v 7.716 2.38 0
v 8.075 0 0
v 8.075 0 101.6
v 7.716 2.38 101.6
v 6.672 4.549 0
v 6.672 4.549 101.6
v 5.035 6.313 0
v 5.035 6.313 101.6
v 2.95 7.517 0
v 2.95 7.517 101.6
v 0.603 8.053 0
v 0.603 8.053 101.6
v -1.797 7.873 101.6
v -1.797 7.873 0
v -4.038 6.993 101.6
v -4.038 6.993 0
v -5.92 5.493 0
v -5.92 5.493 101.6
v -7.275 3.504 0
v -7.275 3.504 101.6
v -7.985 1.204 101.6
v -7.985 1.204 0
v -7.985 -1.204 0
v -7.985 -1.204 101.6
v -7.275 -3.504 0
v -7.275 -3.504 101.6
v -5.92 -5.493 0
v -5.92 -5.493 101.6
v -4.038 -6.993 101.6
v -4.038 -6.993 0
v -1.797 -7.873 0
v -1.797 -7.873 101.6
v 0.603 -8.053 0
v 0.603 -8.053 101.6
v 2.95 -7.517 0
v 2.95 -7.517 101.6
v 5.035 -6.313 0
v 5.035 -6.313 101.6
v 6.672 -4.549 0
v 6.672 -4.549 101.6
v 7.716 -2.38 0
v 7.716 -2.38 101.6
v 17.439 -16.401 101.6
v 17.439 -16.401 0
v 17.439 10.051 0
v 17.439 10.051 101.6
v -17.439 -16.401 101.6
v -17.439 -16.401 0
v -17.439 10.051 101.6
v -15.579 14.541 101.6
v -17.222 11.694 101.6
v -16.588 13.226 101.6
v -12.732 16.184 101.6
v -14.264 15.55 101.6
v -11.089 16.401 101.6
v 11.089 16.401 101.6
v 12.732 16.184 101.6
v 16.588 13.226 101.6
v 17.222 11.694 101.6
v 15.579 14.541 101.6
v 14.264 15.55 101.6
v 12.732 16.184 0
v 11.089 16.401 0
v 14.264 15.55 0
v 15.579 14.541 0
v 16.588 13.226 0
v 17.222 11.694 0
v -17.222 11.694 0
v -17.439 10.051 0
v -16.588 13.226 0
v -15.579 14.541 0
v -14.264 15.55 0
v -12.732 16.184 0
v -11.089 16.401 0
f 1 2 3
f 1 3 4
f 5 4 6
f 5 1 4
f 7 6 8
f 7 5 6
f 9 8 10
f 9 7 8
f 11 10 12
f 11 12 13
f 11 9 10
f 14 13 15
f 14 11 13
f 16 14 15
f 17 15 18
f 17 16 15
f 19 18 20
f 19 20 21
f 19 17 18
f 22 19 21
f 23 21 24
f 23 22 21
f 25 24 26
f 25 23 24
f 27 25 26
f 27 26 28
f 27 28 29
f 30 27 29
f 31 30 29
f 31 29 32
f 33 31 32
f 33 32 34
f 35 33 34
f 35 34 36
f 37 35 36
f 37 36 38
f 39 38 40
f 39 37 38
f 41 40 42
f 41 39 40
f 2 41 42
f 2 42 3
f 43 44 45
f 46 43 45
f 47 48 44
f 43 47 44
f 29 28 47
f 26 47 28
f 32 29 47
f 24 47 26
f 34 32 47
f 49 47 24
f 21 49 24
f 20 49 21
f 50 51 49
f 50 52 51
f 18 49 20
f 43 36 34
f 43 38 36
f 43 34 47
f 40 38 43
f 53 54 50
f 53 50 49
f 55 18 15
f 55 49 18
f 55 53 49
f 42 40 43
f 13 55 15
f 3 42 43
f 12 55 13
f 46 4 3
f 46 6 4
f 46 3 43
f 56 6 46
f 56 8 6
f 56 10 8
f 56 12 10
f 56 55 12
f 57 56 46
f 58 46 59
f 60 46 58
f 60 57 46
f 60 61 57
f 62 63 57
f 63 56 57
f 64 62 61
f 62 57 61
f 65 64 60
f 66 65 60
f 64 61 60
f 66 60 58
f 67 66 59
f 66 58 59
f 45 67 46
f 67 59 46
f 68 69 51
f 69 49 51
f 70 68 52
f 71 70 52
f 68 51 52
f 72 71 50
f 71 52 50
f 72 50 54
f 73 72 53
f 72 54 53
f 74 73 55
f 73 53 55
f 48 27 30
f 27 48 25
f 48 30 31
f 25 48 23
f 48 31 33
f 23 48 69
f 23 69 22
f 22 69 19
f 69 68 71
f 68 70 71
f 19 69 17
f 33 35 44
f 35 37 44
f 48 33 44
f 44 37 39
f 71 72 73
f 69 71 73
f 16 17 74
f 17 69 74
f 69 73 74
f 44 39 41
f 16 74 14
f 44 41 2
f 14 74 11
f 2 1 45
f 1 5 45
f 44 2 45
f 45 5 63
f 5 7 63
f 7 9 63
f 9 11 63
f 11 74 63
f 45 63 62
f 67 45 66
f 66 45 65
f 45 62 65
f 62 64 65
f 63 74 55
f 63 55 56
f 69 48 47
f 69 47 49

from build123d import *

# Parameters (mm, degrees)
F0_W     = 34.877166
F0_H     = 32.801156
F0_R     = 8.075164
F1_DEPTH = 101.6
F2_R     = 6.35


with BuildPart() as f1:
    # F0 (on Top) → F1 (new body)
    with BuildSketch(Plane.XY):
        Rectangle(F0_W, F0_H)
        Circle(F0_R, mode=Mode.SUBTRACT)
    extrude(amount=F1_DEPTH)

    # F2
    f2_edges = [f1.edges().sort_by_distance(p)[0] for p in [
        (-17.438583, 16.400578, 50.8),
        (17.438583, 16.400578, 50.8),
    ]]
    fillet(f2_edges, radius=F2_R)


solid = f1.part
